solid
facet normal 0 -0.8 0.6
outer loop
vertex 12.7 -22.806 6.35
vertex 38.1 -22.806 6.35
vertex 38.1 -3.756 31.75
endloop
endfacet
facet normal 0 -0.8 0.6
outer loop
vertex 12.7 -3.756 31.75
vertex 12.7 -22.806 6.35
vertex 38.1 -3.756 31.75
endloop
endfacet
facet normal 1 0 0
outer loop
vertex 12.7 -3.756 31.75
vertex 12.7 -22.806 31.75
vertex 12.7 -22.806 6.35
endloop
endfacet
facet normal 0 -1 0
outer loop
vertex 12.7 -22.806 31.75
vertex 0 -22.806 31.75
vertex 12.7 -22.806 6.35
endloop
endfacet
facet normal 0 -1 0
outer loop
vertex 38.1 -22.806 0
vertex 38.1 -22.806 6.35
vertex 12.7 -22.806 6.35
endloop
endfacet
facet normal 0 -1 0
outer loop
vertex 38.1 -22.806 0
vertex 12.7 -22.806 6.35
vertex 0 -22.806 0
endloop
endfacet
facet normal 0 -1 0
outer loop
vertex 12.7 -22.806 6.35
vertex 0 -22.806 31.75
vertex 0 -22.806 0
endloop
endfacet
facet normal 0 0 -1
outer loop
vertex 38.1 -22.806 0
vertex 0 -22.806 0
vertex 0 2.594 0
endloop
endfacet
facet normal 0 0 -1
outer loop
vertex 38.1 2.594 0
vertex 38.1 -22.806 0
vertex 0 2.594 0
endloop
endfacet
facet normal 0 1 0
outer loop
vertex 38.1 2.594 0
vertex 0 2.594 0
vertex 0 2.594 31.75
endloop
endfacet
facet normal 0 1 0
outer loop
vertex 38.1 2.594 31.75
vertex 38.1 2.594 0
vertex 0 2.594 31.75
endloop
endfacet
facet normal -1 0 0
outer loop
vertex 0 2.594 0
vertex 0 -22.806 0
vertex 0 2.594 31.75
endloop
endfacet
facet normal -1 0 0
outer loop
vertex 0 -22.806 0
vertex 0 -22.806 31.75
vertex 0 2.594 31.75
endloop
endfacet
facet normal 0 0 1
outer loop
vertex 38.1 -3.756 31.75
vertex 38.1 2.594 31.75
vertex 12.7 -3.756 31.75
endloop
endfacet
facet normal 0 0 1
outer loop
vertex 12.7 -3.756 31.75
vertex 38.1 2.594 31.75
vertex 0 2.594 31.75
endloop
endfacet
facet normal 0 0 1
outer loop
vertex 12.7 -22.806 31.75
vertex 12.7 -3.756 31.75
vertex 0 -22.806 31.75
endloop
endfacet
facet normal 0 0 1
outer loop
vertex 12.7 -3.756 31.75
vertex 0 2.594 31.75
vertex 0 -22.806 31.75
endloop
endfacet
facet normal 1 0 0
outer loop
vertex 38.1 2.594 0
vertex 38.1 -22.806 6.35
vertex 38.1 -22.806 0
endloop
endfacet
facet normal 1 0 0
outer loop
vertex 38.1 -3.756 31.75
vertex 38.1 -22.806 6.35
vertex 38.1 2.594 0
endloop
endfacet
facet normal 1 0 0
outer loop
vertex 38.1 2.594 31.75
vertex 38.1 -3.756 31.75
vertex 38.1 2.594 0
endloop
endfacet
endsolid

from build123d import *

# Parameters (mm, degrees)
F1_DEPTH = 38.1
F3_DEPTH = 25.4


with BuildPart() as f1:
    # F0 (on Right) → F1 (new body)
    with BuildSketch(Plane.YZ):
        Polygon((-22.806338, 0), (0, 0), (2.593662, 0), (2.593662, 31.75), (-22.806338, 31.75), align=None)
    extrude(amount=F1_DEPTH)

    # F2 (on face) → F3 (cut)
    with BuildSketch(Plane.YZ.offset(38.1)):
        Polygon((-3.756338, 31.75), (-22.806338, 31.75), (-22.806338, 6.35), align=None)
    extrude(amount=-F3_DEPTH, mode=Mode.SUBTRACT)


solid = f1.part
